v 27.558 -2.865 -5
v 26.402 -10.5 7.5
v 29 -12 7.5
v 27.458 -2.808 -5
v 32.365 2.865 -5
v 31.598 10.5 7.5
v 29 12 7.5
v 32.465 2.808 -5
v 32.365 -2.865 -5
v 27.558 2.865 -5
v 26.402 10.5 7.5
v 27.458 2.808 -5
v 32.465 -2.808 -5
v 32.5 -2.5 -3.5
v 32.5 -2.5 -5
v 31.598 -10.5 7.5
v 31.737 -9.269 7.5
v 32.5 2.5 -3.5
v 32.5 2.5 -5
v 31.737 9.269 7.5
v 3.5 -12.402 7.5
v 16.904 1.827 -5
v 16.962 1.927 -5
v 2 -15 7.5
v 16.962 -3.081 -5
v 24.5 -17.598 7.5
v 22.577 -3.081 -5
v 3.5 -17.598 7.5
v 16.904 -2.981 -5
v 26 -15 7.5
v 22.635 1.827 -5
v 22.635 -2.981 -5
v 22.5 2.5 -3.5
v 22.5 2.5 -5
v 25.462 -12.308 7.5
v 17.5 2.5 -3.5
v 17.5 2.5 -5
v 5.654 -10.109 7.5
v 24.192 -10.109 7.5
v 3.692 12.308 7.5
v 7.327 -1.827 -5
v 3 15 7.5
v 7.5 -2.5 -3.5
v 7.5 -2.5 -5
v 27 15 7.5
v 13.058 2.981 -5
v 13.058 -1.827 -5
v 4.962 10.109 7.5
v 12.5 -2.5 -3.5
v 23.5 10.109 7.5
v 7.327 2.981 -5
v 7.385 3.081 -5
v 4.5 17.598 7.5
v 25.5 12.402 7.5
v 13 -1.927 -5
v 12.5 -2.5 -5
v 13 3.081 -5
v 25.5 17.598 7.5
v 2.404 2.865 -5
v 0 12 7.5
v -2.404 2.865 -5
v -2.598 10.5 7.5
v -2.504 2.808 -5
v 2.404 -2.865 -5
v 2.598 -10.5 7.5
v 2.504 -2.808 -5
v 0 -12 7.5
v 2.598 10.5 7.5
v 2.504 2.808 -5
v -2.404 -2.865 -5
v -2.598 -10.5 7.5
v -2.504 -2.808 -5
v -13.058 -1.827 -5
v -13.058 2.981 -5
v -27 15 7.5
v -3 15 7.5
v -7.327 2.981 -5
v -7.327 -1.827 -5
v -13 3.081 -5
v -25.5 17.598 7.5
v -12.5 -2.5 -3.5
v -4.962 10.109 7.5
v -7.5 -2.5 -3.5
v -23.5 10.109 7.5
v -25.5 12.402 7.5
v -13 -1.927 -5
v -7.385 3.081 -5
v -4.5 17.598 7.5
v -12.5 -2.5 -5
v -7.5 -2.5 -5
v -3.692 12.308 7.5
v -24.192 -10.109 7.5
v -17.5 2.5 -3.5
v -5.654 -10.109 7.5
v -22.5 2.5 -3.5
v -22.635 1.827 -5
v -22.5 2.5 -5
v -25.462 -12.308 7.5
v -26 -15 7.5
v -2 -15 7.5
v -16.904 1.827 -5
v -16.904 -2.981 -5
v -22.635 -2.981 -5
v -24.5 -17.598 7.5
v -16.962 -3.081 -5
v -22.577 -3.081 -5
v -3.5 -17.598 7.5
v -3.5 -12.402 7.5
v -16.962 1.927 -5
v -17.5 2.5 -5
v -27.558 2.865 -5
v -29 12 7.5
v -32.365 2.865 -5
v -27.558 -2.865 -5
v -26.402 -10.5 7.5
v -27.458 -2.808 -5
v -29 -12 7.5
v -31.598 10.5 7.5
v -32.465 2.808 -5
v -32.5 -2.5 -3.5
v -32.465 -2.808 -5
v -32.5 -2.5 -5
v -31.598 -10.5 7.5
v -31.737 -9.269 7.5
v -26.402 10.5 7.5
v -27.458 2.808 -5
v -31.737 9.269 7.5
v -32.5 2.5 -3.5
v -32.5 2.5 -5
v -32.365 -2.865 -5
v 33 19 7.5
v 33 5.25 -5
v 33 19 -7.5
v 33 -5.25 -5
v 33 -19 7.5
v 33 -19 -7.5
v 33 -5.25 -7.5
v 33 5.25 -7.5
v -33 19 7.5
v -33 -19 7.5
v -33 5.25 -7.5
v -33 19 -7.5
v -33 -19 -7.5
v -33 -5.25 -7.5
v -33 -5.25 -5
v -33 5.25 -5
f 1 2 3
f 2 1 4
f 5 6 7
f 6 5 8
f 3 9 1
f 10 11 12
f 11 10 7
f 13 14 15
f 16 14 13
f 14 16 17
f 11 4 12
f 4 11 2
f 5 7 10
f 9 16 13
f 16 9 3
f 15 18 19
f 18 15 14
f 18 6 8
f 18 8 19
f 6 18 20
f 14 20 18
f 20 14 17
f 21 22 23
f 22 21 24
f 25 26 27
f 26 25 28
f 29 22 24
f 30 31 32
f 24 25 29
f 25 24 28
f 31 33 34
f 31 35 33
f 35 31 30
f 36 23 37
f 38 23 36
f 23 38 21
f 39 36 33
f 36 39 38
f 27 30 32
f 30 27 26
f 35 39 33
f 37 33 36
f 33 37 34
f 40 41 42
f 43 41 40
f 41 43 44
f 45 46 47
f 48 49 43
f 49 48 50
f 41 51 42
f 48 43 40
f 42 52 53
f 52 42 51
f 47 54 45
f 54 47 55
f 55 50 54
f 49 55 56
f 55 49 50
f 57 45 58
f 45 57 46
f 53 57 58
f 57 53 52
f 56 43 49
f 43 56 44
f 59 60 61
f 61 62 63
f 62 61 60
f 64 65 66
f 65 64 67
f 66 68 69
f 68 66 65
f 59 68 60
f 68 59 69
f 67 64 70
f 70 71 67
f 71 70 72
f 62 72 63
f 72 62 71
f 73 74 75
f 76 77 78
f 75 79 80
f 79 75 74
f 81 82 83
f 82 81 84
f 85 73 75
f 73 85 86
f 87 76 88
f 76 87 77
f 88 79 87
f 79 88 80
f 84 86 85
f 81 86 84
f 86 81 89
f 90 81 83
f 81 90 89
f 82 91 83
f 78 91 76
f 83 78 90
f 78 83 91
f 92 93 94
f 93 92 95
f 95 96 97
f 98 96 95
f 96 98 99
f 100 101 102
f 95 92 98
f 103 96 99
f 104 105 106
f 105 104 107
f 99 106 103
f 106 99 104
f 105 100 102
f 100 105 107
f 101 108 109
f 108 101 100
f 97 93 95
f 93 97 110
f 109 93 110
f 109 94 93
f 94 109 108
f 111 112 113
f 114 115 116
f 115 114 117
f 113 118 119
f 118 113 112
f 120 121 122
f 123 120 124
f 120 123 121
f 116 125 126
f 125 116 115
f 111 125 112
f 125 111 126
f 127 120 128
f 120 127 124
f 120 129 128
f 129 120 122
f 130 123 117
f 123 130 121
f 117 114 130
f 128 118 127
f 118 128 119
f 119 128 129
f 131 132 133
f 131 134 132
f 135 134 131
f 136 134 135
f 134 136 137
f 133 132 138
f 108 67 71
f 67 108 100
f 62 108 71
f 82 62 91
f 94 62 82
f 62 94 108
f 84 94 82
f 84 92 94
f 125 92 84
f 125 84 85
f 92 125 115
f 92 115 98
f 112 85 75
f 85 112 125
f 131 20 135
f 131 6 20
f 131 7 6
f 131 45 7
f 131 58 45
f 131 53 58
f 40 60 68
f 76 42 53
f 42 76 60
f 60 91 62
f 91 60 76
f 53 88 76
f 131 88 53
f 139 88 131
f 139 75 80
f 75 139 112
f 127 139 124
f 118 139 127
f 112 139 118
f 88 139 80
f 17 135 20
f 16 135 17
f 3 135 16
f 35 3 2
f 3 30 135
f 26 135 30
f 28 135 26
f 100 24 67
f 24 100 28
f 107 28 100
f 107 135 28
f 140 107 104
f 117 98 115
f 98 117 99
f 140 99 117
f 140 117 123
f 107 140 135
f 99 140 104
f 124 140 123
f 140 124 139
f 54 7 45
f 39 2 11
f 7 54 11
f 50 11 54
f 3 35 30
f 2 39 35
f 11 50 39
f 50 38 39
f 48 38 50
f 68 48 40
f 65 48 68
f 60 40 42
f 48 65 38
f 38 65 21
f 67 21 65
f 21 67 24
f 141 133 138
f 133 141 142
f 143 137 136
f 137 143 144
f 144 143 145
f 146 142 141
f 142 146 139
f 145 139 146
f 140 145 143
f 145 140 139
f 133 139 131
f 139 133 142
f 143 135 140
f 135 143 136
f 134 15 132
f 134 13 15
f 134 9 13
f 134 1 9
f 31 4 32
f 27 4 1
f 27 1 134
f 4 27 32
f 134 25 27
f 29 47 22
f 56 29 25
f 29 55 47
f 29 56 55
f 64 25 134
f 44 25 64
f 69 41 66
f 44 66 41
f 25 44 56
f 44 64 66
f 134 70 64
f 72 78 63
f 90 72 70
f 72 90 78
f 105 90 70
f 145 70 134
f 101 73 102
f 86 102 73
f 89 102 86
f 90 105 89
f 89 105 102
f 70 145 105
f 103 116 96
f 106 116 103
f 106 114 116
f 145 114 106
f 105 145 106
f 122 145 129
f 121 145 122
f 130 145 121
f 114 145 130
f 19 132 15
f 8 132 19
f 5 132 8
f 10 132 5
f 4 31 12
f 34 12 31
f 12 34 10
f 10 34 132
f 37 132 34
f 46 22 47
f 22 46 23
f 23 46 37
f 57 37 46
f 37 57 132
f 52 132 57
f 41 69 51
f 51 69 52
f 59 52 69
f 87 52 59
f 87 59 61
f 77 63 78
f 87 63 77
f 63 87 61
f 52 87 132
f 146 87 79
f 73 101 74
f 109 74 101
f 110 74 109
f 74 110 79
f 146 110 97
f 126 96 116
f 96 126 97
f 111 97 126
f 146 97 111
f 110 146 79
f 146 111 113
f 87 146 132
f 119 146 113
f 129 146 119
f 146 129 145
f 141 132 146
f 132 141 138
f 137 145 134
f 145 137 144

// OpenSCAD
// WS2812 LED Strip Parameters - verified measurements
led_spacing = 10;      // 10mm between LED centers
strip_width = 10;      // 10mm wide LED strip
strip_height = 2;      // Keep same
tolerance = 0.5;       // Keep same
led_size = 5;         // 5mm square LED cutouts

// Updated Base Parameters
base_width = 66;      // Optimized smaller base
base_length = 38;     // Adjusted proportionally
base_height = 15;     // Increased by 25% from 25mm

// Updated 7-Segment Display Parameters
segment_h_length = 24;    // Increased horizontal length for wider number
segment_width = 6;        // Keep wider segments

// Add diffuser parameters
diffuser_height = .5;

// Define LED positions globally
led1 = [0, -3.0 * led_spacing];  // LED1
led2 = [0,-2.0 * led_spacing];  // LED2
led3 = [0,-1.0 * led_spacing];  // LED3
led4 = [0,0.0 * led_spacing];   // LED4 - Center LED
led5 = [0,1.0 * led_spacing];   // LED5
led6 = [0,2.0 * led_spacing];   // LED6
led7 = [0,3.0 * led_spacing];   // LED7

// Define segment positions globally - Wide and squished
seg_f = [-15, 14];     // F (top left vertical) - moved outward
seg_e = [-15, -14];    // E (bottom left vertical) - moved outward
seg_a = [0, 29];      // A (top horizontal) - same height
seg_g = [0, 0];       // G (middle horizontal) - unchanged
seg_b = [15, 15];      // B (top right vertical) - moved closer
seg_c = [15, -15];     // C (bottom right vertical) - moved closer
seg_d = [0, -29];     // D (bottom horizontal) - moved closer

// LED Strip Channel with wire channels - centered
module led_channel() {
    // Main channel exactly 10mm wide plus tolerance
    translate([-base_width/2 , -strip_width/2 - tolerance/2, -base_height/2])
        cube([base_width, strip_width + tolerance, strip_height + tolerance]);
}

// Single light pipe cavity with elongating shape
module light_cavity(led_pos, segment_pos, is_horizontal=false) {
    // Calculate heights for better progression
    z_bottom = -base_height/2 + strip_height;
    z_top = base_height/2;
    total_height = z_top - z_bottom;
    
    hull() {
        // Bottom (at LED) - small square
        translate([led_pos[0] - led_size/2, led_pos[1] - led_size/2, z_bottom])
            cube([led_size, led_size, 2]);
     
            
        // Top (at segment) - full segment shape
        translate([segment_pos[0], segment_pos[1], z_top ]) {
            rotate([0, 0, is_horizontal ? 0 : 90])
                linear_extrude(height=2)
                    segment(segment_h_length, segment_width);
        }
    }
    
}

// All light cavities with corrected segment positions and mirroring
module all_cavities(visualization=false) {
    
    rotate([0, 0, 90]) {
        // Light paths
        light_cavity(led1, seg_d, true);   // LED1 → F (vertical)
        light_cavity(led2, seg_e, false);   // LED2 → E (vertical)
        light_cavity(led3, seg_c, false);    // LED3 → A (horizontal)
        light_cavity(led4, seg_g, true);    // LED4 → G (horizontal)
        light_cavity(led5, seg_b, false);   // LED5 → B (vertical)
        light_cavity(led6, seg_f, false);   // LED6 → C (vertical)
        light_cavity(led7, seg_a, true);    // LED6 → D (horizontal)
    }
}

// Base with LED channel, cavities, 
module base() {
    difference() {
        // Main block
        cube([base_width, base_length, base_height], center=true);             
        // LED channel
        led_channel();
        // Light pipe cavities
        all_cavities(false);  // Use same paths for actual cavities
    }
}

module segment(length, width) {
    // Elongated hexagonal shape
    hull() {
        translate([-length/2 + width/2, 0, 0]) 
            circle(d=width, $fn=6);
        translate([length/2 - width/2, 0, 0])  
            circle(d=width, $fn=6);
    }
}

// Diffuser layer module
module diffuser_layer() {
    translate([0, 0, base_height/2 - .5])  // Changed to sit directly on base
        cube([base_width, base_length, diffuser_height], center=true);
}

// // Render just the paths in red with slight transparency
// //all_cavities(true);  // Show paths
// union() {
//    base();
// //    diffuser_layer();
// }
   
// New module for the intersection shape
module intersection_layer() {
        color("Red", alpha=0.9)  // Semi-transparent to visualize

        intersection() {
            all_cavities(true);
            diffuser_layer();
        };
    } 

// union(){
// Replace the final union() with:
//intersection_layer();
base();
// }
